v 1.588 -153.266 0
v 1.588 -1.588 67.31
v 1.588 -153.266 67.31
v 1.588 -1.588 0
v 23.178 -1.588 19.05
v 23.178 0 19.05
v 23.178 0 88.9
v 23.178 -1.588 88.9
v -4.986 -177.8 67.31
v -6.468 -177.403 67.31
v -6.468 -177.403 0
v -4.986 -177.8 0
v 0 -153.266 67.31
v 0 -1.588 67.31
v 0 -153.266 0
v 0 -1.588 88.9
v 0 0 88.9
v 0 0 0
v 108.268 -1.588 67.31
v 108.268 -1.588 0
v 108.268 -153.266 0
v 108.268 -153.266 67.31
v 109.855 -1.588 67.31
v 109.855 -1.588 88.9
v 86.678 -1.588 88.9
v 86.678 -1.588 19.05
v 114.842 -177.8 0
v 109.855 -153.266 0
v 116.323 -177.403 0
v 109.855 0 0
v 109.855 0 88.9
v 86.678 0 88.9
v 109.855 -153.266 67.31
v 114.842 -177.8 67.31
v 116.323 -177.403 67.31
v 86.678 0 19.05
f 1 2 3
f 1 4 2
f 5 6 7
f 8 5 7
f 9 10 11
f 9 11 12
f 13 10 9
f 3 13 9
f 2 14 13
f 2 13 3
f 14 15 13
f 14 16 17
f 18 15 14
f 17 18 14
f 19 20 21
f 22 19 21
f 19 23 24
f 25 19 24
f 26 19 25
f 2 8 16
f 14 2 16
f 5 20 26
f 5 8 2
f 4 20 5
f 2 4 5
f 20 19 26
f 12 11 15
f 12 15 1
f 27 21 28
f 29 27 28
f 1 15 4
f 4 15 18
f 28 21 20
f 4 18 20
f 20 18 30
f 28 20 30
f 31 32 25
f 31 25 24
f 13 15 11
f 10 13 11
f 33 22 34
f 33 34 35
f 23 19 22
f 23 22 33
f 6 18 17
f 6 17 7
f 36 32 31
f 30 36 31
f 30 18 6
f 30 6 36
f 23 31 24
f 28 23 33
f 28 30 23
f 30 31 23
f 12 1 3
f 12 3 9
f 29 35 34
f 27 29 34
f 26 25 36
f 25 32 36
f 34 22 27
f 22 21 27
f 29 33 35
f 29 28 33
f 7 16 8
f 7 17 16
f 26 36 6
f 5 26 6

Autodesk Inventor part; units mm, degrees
ref_plane "YZ Plane" through (0, 0, 0) normal (1, 0, 0) x (0, 1, 0)
ref_plane "XZ Plane" through (0, 0, 0) normal (0, 1, 0) x (-1, 0, 0)
sketch "Sketch1" plane through (0, 0, 0) normal (0, 0, 1) x (1, 0, 0)
  line L0 (0, 0) -> (109.855, 0)
  line L1 (109.855, 0) -> (109.855, -1.5875)
  line L2 (109.855, -1.5875) -> (0, -1.5875)
  line L3 (0, -1.5875) -> (0, 0)
  line L4 (109.855, 0) -> (108.2675, 0)
  line L5 (108.2675, 0) -> (108.2675, -153.2655)
  line L6 (108.2675, -153.2655) -> (109.855, -153.2655)
  line L7 (109.855, -153.2655) -> (109.855, 0)
  line L8 (0, 0) -> (1.5875, 0)
  line L9 (1.5875, 0) -> (1.5875, -153.2655)
  line L10 (1.5875, -153.2655) -> (0, -153.2655)
  line L11 (0, -153.2655) -> (0, 0)
  line L12 (0, -151.678) -> (25.4, -151.678) construction
  line L13 (1.5875, -153.2655) -> (38.1, -153.2655) construction
  line L14 (0, -153.2655) -> (-6.4677, -177.4031)
  line L15 (1.5875, -153.2655) -> (-4.9865, -177.8)
  line L16 (-6.4677, -177.4031) -> (-4.9865, -177.8)
  line L17 (54.9275, 0) -> (54.9275, -59.745)
  line L18 (109.855, -153.2655) -> (116.3227, -177.4031)
  line L19 (108.2675, -153.2655) -> (114.8415, -177.8)
  line L20 (116.3227, -177.4031) -> (114.8415, -177.8)
  dimension "d1" = 1.5875
  dimension "d2" = 1.5875
  dimension "d3" = 153.2655
  dimension "d5" = 153.2655
  dimension "d6" = 1.5875
  dimension "d13" = 1.5875
  dimension "d15" = 106.68
  dimension "d28" = 0
  dimension "d29" = 75
  dimension "d30" = 25.4
  dimension "d31" = 53.34
  dimension "d32" = 177.8
  dimension "d33" = 24.5345
extrude "Extrusion4" add sketch "Sketch1" along normal blind 88.9 contours L0 L9 L2 L3 | L0 L17 L2 L9 | L0 L5 L2 L17 | L0 L1 L2 L5
extrude "Extrusion5" add sketch "Sketch1" along normal blind 67.31 contours L0 L9 L2 L3 | L2 L9 L10 L11 | L10 L15 L16 L14 | L0 L1 L2 L5 | L2 L7 L6 L5 | L6 L18 L20 L19
ref_plane "Work Plane3" through (54.9275, 0, 88.9) normal (1, 0, 0) x (0, 0, -1)
sketch "Sketch4" plane through (0, 0, 0) normal (0, 1, 0) x (1, 0, 0)
  line L0 (0, -88.9) -> (109.855, -88.9) projected
  line L1 (23.1775, -88.9) -> (86.6775, -88.9)
  line L2 (86.6775, -88.9) -> (86.6775, -19.05)
  line L3 (86.6775, -19.05) -> (23.1775, -19.05)
  line L4 (23.1775, -19.05) -> (23.1775, -88.9)
  line L5 (109.855, 0) -> (109.855, -88.9) projected
  line L6 (0, 0) -> (0, -88.9) projected
  line L7 (109.855, 0) -> (0, 0) projected
  dimension "d42" = 109.855
  dimension "d43" = 63.5
  dimension "d44" = 23.1775
  dimension "d45" = 19.05
extrude "Extrusion7" cut sketch "Sketch4" against normal through all contours L4 L3 L2 L0
equation "\"d2\" = d1"
equation "\"d3\" = d5"
equation "\"d6\" = d4"
equation "\"d13\" = d2"
equation "\"d44\" = -0.5 * d43 + 0.5 * d42"
equation "\"d4\" = d2"
properties part number "U-Part Gen 2"
